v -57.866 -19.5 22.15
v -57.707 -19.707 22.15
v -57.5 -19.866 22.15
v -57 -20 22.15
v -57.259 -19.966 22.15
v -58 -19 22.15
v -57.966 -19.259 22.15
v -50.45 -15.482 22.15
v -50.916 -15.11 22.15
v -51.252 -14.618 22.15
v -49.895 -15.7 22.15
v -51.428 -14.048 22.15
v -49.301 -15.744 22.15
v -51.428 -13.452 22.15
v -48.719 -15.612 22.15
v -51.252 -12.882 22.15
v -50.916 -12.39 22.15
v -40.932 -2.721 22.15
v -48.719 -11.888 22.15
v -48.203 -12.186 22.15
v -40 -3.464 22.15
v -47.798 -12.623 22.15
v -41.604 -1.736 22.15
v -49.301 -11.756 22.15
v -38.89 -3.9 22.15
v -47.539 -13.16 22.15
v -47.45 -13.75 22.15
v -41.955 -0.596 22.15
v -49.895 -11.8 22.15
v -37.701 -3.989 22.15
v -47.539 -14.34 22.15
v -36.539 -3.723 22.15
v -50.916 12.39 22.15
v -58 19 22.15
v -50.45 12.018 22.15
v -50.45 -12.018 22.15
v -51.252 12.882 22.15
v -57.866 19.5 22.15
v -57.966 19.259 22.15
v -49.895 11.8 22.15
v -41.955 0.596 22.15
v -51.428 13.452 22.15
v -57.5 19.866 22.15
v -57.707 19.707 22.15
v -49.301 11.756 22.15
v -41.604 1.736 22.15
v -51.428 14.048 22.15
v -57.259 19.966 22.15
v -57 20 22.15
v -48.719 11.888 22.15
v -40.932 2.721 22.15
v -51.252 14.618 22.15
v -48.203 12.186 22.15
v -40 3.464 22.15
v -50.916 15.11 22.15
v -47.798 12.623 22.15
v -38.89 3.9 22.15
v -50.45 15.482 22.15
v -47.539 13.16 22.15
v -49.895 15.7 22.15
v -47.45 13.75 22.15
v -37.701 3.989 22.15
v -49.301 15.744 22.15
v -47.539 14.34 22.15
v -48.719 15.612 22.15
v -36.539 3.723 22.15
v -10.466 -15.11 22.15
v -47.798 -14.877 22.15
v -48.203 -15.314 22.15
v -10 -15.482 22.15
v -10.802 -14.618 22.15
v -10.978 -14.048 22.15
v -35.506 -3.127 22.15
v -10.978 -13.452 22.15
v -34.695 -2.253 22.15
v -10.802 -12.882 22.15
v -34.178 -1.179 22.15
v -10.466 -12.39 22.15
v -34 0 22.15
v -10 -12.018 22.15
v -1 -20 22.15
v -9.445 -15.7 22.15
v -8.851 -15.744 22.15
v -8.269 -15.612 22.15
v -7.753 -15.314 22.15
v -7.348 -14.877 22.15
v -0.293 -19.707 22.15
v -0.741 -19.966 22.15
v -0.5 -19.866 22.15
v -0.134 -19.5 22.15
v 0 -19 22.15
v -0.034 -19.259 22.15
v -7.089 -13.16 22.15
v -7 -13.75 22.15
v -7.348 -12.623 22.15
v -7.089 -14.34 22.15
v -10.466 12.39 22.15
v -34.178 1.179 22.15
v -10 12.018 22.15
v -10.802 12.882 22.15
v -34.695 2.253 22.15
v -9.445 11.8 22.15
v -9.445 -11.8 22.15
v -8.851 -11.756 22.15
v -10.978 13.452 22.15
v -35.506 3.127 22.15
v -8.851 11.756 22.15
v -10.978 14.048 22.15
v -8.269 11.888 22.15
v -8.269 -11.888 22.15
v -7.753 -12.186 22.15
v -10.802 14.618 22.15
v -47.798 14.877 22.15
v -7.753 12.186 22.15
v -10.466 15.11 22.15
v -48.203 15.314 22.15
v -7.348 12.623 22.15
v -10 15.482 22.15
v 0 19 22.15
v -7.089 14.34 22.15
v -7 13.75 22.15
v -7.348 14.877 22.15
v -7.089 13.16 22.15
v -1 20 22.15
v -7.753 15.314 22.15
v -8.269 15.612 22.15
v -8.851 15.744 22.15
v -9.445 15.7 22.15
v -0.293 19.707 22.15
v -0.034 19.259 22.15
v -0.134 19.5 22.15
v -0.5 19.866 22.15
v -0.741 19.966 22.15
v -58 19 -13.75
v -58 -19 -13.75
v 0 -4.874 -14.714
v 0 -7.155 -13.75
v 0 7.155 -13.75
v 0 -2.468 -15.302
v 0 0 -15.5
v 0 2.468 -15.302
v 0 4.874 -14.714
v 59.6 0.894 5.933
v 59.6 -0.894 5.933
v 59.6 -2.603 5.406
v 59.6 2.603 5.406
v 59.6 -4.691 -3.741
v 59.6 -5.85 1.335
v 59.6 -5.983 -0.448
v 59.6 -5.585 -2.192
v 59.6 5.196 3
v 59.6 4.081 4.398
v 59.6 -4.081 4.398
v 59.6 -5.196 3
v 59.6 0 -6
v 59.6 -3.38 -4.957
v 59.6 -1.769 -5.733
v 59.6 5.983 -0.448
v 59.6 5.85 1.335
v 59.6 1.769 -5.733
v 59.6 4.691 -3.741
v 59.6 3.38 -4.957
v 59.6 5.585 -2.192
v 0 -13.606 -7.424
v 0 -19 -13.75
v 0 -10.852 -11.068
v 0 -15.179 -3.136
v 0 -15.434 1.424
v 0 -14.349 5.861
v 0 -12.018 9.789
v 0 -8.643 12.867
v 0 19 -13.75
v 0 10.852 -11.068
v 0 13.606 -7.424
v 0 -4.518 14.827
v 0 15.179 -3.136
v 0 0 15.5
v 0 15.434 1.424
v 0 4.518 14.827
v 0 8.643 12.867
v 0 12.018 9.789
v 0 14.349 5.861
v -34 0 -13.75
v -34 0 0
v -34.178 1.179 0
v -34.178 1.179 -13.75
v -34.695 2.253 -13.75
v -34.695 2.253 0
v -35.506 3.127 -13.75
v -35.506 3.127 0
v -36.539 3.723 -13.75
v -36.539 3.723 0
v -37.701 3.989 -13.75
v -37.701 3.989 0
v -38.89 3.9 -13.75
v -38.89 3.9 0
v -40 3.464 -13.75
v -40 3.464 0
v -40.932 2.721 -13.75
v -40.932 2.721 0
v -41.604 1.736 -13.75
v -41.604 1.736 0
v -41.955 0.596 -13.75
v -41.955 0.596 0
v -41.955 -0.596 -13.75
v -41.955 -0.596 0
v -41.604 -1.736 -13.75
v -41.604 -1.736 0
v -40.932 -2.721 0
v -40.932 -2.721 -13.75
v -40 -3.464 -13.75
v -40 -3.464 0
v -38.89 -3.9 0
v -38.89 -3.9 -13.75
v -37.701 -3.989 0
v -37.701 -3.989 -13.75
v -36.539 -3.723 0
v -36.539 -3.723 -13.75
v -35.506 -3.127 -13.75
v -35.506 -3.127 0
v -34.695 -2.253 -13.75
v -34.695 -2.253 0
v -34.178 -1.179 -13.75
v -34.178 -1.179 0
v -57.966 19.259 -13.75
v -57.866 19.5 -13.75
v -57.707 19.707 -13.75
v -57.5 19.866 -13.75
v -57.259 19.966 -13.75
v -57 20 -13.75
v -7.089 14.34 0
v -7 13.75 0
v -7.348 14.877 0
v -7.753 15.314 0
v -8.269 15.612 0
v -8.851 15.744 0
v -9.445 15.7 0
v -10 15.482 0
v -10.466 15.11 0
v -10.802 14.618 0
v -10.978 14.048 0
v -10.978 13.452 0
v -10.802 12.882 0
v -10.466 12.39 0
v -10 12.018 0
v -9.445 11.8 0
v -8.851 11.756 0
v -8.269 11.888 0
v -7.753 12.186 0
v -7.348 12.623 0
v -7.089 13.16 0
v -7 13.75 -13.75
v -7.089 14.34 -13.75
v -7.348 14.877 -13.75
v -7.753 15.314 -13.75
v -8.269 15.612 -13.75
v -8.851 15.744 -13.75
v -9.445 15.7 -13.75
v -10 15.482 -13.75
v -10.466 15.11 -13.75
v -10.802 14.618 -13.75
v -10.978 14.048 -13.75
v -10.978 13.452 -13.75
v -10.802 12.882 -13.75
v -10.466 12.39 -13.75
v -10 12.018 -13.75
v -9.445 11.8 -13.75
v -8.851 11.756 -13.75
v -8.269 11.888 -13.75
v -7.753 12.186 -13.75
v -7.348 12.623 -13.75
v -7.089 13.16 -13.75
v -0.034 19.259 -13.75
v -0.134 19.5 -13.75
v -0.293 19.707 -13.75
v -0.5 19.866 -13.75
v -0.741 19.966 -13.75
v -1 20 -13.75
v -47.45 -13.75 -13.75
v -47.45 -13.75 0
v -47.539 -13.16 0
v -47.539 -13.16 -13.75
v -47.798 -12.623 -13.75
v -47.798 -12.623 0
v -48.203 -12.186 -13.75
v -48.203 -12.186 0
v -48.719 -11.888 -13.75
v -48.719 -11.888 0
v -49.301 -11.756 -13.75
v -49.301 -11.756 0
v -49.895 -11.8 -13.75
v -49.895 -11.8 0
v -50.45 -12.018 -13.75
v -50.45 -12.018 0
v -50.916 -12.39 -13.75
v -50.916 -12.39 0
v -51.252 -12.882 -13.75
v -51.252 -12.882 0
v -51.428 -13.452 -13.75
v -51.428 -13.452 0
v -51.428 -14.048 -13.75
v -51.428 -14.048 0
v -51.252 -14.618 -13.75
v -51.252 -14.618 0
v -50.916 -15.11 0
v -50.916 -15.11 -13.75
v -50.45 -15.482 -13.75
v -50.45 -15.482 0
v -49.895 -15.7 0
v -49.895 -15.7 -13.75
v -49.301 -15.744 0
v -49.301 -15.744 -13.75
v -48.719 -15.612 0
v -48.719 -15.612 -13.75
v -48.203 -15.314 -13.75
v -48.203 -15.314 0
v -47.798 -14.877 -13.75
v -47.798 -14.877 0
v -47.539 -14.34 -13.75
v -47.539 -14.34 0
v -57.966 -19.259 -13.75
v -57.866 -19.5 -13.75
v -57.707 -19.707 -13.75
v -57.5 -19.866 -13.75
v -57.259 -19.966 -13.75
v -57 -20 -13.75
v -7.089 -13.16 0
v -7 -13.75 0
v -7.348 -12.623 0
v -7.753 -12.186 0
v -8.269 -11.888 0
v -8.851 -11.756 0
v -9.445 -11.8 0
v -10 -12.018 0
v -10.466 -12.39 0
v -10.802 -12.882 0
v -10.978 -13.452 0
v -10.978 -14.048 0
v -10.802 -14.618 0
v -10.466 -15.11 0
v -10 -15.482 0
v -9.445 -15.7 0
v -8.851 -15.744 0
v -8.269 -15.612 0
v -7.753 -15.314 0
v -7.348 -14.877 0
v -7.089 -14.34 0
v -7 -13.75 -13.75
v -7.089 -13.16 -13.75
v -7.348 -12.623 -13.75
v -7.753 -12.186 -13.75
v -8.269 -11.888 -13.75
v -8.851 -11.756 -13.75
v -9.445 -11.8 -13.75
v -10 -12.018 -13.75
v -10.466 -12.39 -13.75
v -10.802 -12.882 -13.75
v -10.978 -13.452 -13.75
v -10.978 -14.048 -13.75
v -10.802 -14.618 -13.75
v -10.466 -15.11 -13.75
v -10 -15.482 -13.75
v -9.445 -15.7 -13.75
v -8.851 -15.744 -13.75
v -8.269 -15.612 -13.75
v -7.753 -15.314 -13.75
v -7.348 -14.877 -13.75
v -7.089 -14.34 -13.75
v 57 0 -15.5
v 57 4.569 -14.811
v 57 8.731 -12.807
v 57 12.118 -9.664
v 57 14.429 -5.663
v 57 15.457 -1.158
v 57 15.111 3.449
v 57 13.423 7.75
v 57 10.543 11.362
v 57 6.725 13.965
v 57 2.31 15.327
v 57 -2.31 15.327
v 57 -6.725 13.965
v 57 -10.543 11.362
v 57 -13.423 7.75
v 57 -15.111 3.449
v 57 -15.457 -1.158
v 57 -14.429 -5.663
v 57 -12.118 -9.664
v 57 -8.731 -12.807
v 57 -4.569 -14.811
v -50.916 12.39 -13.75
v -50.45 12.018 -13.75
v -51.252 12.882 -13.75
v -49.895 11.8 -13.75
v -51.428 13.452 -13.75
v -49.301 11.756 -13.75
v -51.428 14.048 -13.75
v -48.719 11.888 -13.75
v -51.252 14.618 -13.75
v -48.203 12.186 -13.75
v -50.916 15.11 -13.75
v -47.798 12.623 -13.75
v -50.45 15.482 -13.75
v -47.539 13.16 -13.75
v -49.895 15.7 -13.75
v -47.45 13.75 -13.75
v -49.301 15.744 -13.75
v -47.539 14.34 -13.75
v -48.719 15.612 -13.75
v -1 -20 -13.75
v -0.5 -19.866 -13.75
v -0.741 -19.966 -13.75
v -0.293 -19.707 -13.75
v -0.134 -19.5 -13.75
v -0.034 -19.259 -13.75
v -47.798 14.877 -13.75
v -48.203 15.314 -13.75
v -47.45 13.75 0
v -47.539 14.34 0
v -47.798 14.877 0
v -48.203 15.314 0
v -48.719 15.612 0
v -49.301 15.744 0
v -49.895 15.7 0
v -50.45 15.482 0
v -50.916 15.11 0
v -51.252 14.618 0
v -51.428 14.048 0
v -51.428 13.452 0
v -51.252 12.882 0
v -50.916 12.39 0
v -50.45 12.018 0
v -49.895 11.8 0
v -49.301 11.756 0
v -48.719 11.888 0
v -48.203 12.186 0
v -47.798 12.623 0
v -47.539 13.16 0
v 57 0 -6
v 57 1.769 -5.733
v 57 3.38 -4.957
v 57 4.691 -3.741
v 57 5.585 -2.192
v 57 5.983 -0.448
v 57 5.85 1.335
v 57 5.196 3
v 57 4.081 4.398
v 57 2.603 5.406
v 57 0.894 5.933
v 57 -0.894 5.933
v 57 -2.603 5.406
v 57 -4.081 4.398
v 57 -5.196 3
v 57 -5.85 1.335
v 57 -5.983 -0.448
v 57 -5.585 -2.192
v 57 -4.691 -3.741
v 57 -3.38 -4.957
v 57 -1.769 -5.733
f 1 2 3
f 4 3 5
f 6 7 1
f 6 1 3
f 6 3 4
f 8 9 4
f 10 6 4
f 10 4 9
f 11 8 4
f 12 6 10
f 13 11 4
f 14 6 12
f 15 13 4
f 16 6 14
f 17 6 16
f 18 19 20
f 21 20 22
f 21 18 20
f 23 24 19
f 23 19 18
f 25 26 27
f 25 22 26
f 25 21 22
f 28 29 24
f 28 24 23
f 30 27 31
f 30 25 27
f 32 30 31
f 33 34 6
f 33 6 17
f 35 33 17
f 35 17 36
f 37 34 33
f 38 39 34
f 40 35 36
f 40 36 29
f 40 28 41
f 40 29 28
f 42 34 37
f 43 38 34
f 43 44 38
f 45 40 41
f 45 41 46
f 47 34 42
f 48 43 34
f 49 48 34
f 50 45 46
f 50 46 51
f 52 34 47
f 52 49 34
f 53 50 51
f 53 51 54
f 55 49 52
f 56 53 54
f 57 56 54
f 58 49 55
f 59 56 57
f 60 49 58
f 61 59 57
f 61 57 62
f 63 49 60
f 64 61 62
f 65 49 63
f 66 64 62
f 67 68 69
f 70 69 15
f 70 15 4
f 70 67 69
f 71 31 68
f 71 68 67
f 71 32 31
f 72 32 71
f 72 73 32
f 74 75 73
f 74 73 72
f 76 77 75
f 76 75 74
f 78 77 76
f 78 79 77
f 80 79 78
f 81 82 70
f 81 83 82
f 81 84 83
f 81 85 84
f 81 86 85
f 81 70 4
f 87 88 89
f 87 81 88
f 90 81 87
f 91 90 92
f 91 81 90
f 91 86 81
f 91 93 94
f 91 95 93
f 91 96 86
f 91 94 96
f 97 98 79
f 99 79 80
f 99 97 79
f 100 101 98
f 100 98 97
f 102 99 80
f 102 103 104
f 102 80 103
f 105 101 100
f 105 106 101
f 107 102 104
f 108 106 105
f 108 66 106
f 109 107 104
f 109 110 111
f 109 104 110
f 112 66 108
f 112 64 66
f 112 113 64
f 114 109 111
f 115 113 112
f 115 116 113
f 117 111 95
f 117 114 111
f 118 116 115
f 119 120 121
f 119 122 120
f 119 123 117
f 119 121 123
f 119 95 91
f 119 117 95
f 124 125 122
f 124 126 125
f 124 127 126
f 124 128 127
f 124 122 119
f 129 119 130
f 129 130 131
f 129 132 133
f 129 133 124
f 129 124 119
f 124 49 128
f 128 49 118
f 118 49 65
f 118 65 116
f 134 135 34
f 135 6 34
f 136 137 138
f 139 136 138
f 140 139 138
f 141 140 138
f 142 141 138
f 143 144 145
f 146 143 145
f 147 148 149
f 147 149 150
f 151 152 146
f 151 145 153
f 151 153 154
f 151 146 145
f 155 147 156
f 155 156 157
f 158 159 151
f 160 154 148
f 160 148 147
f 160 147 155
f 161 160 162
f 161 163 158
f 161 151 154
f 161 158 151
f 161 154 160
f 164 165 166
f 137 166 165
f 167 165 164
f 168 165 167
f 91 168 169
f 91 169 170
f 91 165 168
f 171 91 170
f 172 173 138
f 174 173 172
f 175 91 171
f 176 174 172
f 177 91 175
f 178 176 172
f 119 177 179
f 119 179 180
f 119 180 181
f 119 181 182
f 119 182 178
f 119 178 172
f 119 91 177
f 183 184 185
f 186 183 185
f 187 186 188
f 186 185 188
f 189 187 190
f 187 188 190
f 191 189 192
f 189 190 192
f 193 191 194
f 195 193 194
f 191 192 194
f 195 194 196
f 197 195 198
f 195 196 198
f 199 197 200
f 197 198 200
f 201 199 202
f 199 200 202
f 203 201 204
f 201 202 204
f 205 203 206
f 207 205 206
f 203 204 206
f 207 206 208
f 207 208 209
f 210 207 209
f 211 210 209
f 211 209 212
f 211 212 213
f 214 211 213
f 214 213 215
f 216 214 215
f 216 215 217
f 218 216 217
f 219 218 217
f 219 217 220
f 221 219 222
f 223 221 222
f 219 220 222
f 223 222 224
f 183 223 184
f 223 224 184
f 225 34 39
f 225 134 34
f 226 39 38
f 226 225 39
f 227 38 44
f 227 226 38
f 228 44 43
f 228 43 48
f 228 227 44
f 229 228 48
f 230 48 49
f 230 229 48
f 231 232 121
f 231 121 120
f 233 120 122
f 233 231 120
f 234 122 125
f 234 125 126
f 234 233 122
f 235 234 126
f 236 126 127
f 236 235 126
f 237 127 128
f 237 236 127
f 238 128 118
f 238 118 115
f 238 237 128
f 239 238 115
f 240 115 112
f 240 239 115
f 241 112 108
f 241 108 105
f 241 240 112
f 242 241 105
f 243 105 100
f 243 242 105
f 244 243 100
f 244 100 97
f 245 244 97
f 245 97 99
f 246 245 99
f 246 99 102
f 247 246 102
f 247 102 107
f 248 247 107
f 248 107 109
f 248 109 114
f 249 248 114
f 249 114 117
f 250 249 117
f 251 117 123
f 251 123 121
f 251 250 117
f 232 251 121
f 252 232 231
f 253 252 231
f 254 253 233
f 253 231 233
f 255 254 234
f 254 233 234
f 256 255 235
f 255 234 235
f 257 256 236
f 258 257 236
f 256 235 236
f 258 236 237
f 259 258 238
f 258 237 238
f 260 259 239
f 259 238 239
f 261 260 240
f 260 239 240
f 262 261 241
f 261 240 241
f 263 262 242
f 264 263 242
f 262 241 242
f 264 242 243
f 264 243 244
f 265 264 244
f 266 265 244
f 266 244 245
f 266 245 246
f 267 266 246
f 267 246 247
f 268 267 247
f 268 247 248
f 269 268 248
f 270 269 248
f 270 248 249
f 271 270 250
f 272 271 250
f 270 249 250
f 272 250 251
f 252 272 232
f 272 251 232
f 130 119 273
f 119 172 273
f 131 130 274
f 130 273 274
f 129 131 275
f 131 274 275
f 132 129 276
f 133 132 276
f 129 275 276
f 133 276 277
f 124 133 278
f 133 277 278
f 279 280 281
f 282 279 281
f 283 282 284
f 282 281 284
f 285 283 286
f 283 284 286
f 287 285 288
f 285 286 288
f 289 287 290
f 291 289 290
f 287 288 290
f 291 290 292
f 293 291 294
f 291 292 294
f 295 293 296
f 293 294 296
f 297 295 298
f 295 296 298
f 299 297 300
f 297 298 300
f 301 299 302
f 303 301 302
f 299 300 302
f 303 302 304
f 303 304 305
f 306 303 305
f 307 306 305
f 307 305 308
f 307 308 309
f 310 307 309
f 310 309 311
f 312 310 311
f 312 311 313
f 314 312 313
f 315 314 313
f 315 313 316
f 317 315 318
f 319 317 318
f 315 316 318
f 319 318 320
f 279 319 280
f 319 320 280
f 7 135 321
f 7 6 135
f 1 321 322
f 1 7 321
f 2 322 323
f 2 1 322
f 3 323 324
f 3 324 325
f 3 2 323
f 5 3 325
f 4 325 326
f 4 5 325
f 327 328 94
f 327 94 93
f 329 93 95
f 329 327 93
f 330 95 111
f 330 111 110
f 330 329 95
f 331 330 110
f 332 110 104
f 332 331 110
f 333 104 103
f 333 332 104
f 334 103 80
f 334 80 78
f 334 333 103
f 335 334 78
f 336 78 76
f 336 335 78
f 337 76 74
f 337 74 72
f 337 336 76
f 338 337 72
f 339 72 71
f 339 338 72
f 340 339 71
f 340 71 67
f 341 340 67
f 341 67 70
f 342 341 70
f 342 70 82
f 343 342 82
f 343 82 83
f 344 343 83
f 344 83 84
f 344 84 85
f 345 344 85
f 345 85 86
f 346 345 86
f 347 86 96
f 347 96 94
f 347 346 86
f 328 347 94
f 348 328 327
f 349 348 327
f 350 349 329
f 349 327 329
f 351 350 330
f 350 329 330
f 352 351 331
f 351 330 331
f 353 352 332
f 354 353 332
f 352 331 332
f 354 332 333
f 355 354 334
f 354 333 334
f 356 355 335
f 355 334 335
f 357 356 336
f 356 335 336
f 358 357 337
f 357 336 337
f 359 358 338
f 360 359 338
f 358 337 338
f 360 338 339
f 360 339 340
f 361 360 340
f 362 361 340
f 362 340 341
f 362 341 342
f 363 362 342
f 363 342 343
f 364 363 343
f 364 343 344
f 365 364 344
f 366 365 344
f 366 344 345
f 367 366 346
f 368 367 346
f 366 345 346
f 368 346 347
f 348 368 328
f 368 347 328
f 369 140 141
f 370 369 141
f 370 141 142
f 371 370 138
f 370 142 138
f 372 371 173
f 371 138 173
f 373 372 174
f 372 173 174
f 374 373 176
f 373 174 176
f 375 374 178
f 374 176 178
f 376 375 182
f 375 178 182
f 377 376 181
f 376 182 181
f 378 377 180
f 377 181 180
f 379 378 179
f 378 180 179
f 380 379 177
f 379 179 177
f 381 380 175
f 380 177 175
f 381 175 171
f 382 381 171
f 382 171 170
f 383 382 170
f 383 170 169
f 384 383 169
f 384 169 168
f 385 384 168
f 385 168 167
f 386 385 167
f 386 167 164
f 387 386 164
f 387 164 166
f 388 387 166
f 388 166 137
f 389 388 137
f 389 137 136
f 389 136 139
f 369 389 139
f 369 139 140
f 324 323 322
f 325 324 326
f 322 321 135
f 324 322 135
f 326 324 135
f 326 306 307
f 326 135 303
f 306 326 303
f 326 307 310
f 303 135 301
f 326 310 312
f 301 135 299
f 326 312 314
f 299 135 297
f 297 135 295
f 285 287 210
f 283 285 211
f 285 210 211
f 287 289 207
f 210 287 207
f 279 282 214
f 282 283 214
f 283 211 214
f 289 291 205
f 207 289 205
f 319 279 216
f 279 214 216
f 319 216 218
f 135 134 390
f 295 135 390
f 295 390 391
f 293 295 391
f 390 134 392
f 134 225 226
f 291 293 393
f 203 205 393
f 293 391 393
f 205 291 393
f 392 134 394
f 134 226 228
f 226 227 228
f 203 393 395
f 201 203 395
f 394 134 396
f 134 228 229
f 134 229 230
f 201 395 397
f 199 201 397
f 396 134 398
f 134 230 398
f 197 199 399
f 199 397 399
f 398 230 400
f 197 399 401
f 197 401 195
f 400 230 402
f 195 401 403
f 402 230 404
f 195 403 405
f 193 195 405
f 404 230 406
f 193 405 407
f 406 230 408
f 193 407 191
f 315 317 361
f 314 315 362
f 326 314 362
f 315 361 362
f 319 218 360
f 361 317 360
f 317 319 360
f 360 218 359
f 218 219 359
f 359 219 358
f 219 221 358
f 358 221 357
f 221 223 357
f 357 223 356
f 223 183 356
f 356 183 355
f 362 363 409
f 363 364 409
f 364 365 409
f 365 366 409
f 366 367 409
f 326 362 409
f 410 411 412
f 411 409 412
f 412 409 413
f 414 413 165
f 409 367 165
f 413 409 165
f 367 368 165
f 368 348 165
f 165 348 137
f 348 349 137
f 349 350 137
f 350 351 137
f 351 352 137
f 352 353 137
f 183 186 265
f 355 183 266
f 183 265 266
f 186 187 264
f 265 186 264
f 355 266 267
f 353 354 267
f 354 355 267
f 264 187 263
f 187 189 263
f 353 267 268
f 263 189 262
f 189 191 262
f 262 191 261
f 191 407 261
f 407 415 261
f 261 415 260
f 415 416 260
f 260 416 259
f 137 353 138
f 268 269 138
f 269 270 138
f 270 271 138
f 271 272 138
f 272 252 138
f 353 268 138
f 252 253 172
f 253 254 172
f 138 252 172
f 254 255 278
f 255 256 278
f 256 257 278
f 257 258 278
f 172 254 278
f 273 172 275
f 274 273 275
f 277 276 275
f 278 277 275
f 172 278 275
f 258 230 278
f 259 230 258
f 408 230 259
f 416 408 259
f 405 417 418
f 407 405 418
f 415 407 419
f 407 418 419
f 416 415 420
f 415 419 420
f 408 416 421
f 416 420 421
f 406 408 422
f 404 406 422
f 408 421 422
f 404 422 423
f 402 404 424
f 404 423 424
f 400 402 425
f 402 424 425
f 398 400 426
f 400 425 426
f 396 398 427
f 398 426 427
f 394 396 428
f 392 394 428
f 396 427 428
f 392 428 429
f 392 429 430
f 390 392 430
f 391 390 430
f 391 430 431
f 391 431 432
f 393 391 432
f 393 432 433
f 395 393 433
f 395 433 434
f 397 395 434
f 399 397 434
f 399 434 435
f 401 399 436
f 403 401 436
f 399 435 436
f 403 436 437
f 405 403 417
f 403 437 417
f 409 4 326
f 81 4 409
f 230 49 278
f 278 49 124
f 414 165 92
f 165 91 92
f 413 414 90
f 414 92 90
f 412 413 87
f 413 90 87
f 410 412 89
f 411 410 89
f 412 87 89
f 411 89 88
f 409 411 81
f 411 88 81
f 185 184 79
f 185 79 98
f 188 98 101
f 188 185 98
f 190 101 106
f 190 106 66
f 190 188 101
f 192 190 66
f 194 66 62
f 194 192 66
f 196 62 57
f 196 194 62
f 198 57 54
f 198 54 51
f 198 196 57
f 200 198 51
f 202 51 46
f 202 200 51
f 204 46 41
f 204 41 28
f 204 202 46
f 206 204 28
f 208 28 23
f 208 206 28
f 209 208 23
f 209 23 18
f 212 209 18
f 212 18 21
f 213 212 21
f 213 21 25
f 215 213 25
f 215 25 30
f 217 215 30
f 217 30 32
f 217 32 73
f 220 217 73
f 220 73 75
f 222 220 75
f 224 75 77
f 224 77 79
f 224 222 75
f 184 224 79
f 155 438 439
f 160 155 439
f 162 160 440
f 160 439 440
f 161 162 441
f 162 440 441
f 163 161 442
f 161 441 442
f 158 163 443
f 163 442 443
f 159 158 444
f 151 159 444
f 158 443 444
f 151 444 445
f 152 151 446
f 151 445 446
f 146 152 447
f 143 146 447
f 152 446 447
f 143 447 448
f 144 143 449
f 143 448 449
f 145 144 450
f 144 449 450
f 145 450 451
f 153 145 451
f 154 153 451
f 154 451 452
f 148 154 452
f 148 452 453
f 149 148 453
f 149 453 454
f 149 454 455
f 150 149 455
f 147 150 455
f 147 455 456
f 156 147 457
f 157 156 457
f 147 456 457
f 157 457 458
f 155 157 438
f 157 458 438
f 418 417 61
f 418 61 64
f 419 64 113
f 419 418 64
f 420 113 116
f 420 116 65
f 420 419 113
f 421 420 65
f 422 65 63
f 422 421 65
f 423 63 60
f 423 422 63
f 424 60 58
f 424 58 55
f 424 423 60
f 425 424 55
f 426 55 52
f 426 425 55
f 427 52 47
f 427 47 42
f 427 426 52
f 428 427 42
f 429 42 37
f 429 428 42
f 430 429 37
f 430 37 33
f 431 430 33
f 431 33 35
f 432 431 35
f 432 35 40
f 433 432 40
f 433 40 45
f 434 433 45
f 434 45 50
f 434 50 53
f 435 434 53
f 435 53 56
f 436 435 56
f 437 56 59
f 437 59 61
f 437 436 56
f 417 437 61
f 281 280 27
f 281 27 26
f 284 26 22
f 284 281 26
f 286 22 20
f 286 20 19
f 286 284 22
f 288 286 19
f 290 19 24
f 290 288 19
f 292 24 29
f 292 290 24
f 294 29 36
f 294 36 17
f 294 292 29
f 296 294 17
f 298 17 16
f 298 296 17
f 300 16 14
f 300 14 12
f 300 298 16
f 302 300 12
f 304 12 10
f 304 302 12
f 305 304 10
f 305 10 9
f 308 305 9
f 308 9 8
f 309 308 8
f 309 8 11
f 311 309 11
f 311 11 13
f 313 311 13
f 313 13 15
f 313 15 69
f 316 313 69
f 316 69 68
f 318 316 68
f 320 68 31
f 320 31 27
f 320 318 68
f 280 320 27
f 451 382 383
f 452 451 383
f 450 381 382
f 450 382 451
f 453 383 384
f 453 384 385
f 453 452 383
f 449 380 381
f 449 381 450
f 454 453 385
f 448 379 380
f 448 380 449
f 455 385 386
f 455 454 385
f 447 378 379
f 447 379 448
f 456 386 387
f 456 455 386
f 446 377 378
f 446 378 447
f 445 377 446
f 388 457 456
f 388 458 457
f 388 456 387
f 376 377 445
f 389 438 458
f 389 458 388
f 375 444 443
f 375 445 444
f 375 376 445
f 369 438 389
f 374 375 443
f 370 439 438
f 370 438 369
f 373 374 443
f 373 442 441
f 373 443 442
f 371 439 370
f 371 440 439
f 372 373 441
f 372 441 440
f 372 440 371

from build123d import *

# Parameters (mm, degrees)
SKETCH1_R                = 15.5
BOSS_EXTRUDE1_DEPTH      = 57
SKETCH2_R                = 6
BOSS_EXTRUDE2_DEPTH      = 2.6
SKETCH3_W                = 58
SKETCH3_H                = 40
SKETCH3_R                = 2
SKETCH3_R_2              = 4
BOSS_EXTRUDE3_DEPTH      = 22.15
BOSS_EXTRUDE3_DEPTH_BACK = 13.75
FILLET1_R                = 1


with BuildPart() as part:
    # Sketch1 → Boss-Extrude1 (new body)
    with BuildSketch(Plane(origin=(0, 0, 0), x_dir=(0, 0, -1), z_dir=(1, 0, 0))):
        Circle(SKETCH1_R)
    extrude(amount=BOSS_EXTRUDE1_DEPTH)

    # Sketch2 → Boss-Extrude2 (add)
    with BuildSketch(Plane(origin=(57, 0, 0), x_dir=(0, 0, -1), z_dir=(1, 0, 0))):
        Circle(SKETCH2_R)
    extrude(amount=BOSS_EXTRUDE2_DEPTH)

    # Sketch3 → Boss-Extrude3 (add, two sides)
    with BuildSketch(Plane.XY) as boss_extrude3_sk:
        with Locations((-29, 0)):
            Rectangle(SKETCH3_W, SKETCH3_H)
        with Locations((-9, 13.75)):
            Circle(SKETCH3_R, mode=Mode.SUBTRACT)
        with Locations((-49.45, 13.75)):
            Circle(SKETCH3_R, mode=Mode.SUBTRACT)
        with Locations((-49.45, -13.75)):
            Circle(SKETCH3_R, mode=Mode.SUBTRACT)
        with Locations((-9, -13.75)):
            Circle(SKETCH3_R, mode=Mode.SUBTRACT)
        with Locations((-38, 0)):
            Circle(SKETCH3_R_2, mode=Mode.SUBTRACT)
    extrude(amount=BOSS_EXTRUDE3_DEPTH)
    extrude(boss_extrude3_sk.sketch, amount=-BOSS_EXTRUDE3_DEPTH_BACK)

    # Fillet1
    fillet1_edges = [part.edges().sort_by_distance(p)[0] for p in [
        (0, 20, 4.2),
        (0, -20, 4.2),
        (-58, -20, 4.2),
        (-58, 20, 4.2),
    ]]
    fillet(fillet1_edges, radius=FILLET1_R)


solid = part.part
